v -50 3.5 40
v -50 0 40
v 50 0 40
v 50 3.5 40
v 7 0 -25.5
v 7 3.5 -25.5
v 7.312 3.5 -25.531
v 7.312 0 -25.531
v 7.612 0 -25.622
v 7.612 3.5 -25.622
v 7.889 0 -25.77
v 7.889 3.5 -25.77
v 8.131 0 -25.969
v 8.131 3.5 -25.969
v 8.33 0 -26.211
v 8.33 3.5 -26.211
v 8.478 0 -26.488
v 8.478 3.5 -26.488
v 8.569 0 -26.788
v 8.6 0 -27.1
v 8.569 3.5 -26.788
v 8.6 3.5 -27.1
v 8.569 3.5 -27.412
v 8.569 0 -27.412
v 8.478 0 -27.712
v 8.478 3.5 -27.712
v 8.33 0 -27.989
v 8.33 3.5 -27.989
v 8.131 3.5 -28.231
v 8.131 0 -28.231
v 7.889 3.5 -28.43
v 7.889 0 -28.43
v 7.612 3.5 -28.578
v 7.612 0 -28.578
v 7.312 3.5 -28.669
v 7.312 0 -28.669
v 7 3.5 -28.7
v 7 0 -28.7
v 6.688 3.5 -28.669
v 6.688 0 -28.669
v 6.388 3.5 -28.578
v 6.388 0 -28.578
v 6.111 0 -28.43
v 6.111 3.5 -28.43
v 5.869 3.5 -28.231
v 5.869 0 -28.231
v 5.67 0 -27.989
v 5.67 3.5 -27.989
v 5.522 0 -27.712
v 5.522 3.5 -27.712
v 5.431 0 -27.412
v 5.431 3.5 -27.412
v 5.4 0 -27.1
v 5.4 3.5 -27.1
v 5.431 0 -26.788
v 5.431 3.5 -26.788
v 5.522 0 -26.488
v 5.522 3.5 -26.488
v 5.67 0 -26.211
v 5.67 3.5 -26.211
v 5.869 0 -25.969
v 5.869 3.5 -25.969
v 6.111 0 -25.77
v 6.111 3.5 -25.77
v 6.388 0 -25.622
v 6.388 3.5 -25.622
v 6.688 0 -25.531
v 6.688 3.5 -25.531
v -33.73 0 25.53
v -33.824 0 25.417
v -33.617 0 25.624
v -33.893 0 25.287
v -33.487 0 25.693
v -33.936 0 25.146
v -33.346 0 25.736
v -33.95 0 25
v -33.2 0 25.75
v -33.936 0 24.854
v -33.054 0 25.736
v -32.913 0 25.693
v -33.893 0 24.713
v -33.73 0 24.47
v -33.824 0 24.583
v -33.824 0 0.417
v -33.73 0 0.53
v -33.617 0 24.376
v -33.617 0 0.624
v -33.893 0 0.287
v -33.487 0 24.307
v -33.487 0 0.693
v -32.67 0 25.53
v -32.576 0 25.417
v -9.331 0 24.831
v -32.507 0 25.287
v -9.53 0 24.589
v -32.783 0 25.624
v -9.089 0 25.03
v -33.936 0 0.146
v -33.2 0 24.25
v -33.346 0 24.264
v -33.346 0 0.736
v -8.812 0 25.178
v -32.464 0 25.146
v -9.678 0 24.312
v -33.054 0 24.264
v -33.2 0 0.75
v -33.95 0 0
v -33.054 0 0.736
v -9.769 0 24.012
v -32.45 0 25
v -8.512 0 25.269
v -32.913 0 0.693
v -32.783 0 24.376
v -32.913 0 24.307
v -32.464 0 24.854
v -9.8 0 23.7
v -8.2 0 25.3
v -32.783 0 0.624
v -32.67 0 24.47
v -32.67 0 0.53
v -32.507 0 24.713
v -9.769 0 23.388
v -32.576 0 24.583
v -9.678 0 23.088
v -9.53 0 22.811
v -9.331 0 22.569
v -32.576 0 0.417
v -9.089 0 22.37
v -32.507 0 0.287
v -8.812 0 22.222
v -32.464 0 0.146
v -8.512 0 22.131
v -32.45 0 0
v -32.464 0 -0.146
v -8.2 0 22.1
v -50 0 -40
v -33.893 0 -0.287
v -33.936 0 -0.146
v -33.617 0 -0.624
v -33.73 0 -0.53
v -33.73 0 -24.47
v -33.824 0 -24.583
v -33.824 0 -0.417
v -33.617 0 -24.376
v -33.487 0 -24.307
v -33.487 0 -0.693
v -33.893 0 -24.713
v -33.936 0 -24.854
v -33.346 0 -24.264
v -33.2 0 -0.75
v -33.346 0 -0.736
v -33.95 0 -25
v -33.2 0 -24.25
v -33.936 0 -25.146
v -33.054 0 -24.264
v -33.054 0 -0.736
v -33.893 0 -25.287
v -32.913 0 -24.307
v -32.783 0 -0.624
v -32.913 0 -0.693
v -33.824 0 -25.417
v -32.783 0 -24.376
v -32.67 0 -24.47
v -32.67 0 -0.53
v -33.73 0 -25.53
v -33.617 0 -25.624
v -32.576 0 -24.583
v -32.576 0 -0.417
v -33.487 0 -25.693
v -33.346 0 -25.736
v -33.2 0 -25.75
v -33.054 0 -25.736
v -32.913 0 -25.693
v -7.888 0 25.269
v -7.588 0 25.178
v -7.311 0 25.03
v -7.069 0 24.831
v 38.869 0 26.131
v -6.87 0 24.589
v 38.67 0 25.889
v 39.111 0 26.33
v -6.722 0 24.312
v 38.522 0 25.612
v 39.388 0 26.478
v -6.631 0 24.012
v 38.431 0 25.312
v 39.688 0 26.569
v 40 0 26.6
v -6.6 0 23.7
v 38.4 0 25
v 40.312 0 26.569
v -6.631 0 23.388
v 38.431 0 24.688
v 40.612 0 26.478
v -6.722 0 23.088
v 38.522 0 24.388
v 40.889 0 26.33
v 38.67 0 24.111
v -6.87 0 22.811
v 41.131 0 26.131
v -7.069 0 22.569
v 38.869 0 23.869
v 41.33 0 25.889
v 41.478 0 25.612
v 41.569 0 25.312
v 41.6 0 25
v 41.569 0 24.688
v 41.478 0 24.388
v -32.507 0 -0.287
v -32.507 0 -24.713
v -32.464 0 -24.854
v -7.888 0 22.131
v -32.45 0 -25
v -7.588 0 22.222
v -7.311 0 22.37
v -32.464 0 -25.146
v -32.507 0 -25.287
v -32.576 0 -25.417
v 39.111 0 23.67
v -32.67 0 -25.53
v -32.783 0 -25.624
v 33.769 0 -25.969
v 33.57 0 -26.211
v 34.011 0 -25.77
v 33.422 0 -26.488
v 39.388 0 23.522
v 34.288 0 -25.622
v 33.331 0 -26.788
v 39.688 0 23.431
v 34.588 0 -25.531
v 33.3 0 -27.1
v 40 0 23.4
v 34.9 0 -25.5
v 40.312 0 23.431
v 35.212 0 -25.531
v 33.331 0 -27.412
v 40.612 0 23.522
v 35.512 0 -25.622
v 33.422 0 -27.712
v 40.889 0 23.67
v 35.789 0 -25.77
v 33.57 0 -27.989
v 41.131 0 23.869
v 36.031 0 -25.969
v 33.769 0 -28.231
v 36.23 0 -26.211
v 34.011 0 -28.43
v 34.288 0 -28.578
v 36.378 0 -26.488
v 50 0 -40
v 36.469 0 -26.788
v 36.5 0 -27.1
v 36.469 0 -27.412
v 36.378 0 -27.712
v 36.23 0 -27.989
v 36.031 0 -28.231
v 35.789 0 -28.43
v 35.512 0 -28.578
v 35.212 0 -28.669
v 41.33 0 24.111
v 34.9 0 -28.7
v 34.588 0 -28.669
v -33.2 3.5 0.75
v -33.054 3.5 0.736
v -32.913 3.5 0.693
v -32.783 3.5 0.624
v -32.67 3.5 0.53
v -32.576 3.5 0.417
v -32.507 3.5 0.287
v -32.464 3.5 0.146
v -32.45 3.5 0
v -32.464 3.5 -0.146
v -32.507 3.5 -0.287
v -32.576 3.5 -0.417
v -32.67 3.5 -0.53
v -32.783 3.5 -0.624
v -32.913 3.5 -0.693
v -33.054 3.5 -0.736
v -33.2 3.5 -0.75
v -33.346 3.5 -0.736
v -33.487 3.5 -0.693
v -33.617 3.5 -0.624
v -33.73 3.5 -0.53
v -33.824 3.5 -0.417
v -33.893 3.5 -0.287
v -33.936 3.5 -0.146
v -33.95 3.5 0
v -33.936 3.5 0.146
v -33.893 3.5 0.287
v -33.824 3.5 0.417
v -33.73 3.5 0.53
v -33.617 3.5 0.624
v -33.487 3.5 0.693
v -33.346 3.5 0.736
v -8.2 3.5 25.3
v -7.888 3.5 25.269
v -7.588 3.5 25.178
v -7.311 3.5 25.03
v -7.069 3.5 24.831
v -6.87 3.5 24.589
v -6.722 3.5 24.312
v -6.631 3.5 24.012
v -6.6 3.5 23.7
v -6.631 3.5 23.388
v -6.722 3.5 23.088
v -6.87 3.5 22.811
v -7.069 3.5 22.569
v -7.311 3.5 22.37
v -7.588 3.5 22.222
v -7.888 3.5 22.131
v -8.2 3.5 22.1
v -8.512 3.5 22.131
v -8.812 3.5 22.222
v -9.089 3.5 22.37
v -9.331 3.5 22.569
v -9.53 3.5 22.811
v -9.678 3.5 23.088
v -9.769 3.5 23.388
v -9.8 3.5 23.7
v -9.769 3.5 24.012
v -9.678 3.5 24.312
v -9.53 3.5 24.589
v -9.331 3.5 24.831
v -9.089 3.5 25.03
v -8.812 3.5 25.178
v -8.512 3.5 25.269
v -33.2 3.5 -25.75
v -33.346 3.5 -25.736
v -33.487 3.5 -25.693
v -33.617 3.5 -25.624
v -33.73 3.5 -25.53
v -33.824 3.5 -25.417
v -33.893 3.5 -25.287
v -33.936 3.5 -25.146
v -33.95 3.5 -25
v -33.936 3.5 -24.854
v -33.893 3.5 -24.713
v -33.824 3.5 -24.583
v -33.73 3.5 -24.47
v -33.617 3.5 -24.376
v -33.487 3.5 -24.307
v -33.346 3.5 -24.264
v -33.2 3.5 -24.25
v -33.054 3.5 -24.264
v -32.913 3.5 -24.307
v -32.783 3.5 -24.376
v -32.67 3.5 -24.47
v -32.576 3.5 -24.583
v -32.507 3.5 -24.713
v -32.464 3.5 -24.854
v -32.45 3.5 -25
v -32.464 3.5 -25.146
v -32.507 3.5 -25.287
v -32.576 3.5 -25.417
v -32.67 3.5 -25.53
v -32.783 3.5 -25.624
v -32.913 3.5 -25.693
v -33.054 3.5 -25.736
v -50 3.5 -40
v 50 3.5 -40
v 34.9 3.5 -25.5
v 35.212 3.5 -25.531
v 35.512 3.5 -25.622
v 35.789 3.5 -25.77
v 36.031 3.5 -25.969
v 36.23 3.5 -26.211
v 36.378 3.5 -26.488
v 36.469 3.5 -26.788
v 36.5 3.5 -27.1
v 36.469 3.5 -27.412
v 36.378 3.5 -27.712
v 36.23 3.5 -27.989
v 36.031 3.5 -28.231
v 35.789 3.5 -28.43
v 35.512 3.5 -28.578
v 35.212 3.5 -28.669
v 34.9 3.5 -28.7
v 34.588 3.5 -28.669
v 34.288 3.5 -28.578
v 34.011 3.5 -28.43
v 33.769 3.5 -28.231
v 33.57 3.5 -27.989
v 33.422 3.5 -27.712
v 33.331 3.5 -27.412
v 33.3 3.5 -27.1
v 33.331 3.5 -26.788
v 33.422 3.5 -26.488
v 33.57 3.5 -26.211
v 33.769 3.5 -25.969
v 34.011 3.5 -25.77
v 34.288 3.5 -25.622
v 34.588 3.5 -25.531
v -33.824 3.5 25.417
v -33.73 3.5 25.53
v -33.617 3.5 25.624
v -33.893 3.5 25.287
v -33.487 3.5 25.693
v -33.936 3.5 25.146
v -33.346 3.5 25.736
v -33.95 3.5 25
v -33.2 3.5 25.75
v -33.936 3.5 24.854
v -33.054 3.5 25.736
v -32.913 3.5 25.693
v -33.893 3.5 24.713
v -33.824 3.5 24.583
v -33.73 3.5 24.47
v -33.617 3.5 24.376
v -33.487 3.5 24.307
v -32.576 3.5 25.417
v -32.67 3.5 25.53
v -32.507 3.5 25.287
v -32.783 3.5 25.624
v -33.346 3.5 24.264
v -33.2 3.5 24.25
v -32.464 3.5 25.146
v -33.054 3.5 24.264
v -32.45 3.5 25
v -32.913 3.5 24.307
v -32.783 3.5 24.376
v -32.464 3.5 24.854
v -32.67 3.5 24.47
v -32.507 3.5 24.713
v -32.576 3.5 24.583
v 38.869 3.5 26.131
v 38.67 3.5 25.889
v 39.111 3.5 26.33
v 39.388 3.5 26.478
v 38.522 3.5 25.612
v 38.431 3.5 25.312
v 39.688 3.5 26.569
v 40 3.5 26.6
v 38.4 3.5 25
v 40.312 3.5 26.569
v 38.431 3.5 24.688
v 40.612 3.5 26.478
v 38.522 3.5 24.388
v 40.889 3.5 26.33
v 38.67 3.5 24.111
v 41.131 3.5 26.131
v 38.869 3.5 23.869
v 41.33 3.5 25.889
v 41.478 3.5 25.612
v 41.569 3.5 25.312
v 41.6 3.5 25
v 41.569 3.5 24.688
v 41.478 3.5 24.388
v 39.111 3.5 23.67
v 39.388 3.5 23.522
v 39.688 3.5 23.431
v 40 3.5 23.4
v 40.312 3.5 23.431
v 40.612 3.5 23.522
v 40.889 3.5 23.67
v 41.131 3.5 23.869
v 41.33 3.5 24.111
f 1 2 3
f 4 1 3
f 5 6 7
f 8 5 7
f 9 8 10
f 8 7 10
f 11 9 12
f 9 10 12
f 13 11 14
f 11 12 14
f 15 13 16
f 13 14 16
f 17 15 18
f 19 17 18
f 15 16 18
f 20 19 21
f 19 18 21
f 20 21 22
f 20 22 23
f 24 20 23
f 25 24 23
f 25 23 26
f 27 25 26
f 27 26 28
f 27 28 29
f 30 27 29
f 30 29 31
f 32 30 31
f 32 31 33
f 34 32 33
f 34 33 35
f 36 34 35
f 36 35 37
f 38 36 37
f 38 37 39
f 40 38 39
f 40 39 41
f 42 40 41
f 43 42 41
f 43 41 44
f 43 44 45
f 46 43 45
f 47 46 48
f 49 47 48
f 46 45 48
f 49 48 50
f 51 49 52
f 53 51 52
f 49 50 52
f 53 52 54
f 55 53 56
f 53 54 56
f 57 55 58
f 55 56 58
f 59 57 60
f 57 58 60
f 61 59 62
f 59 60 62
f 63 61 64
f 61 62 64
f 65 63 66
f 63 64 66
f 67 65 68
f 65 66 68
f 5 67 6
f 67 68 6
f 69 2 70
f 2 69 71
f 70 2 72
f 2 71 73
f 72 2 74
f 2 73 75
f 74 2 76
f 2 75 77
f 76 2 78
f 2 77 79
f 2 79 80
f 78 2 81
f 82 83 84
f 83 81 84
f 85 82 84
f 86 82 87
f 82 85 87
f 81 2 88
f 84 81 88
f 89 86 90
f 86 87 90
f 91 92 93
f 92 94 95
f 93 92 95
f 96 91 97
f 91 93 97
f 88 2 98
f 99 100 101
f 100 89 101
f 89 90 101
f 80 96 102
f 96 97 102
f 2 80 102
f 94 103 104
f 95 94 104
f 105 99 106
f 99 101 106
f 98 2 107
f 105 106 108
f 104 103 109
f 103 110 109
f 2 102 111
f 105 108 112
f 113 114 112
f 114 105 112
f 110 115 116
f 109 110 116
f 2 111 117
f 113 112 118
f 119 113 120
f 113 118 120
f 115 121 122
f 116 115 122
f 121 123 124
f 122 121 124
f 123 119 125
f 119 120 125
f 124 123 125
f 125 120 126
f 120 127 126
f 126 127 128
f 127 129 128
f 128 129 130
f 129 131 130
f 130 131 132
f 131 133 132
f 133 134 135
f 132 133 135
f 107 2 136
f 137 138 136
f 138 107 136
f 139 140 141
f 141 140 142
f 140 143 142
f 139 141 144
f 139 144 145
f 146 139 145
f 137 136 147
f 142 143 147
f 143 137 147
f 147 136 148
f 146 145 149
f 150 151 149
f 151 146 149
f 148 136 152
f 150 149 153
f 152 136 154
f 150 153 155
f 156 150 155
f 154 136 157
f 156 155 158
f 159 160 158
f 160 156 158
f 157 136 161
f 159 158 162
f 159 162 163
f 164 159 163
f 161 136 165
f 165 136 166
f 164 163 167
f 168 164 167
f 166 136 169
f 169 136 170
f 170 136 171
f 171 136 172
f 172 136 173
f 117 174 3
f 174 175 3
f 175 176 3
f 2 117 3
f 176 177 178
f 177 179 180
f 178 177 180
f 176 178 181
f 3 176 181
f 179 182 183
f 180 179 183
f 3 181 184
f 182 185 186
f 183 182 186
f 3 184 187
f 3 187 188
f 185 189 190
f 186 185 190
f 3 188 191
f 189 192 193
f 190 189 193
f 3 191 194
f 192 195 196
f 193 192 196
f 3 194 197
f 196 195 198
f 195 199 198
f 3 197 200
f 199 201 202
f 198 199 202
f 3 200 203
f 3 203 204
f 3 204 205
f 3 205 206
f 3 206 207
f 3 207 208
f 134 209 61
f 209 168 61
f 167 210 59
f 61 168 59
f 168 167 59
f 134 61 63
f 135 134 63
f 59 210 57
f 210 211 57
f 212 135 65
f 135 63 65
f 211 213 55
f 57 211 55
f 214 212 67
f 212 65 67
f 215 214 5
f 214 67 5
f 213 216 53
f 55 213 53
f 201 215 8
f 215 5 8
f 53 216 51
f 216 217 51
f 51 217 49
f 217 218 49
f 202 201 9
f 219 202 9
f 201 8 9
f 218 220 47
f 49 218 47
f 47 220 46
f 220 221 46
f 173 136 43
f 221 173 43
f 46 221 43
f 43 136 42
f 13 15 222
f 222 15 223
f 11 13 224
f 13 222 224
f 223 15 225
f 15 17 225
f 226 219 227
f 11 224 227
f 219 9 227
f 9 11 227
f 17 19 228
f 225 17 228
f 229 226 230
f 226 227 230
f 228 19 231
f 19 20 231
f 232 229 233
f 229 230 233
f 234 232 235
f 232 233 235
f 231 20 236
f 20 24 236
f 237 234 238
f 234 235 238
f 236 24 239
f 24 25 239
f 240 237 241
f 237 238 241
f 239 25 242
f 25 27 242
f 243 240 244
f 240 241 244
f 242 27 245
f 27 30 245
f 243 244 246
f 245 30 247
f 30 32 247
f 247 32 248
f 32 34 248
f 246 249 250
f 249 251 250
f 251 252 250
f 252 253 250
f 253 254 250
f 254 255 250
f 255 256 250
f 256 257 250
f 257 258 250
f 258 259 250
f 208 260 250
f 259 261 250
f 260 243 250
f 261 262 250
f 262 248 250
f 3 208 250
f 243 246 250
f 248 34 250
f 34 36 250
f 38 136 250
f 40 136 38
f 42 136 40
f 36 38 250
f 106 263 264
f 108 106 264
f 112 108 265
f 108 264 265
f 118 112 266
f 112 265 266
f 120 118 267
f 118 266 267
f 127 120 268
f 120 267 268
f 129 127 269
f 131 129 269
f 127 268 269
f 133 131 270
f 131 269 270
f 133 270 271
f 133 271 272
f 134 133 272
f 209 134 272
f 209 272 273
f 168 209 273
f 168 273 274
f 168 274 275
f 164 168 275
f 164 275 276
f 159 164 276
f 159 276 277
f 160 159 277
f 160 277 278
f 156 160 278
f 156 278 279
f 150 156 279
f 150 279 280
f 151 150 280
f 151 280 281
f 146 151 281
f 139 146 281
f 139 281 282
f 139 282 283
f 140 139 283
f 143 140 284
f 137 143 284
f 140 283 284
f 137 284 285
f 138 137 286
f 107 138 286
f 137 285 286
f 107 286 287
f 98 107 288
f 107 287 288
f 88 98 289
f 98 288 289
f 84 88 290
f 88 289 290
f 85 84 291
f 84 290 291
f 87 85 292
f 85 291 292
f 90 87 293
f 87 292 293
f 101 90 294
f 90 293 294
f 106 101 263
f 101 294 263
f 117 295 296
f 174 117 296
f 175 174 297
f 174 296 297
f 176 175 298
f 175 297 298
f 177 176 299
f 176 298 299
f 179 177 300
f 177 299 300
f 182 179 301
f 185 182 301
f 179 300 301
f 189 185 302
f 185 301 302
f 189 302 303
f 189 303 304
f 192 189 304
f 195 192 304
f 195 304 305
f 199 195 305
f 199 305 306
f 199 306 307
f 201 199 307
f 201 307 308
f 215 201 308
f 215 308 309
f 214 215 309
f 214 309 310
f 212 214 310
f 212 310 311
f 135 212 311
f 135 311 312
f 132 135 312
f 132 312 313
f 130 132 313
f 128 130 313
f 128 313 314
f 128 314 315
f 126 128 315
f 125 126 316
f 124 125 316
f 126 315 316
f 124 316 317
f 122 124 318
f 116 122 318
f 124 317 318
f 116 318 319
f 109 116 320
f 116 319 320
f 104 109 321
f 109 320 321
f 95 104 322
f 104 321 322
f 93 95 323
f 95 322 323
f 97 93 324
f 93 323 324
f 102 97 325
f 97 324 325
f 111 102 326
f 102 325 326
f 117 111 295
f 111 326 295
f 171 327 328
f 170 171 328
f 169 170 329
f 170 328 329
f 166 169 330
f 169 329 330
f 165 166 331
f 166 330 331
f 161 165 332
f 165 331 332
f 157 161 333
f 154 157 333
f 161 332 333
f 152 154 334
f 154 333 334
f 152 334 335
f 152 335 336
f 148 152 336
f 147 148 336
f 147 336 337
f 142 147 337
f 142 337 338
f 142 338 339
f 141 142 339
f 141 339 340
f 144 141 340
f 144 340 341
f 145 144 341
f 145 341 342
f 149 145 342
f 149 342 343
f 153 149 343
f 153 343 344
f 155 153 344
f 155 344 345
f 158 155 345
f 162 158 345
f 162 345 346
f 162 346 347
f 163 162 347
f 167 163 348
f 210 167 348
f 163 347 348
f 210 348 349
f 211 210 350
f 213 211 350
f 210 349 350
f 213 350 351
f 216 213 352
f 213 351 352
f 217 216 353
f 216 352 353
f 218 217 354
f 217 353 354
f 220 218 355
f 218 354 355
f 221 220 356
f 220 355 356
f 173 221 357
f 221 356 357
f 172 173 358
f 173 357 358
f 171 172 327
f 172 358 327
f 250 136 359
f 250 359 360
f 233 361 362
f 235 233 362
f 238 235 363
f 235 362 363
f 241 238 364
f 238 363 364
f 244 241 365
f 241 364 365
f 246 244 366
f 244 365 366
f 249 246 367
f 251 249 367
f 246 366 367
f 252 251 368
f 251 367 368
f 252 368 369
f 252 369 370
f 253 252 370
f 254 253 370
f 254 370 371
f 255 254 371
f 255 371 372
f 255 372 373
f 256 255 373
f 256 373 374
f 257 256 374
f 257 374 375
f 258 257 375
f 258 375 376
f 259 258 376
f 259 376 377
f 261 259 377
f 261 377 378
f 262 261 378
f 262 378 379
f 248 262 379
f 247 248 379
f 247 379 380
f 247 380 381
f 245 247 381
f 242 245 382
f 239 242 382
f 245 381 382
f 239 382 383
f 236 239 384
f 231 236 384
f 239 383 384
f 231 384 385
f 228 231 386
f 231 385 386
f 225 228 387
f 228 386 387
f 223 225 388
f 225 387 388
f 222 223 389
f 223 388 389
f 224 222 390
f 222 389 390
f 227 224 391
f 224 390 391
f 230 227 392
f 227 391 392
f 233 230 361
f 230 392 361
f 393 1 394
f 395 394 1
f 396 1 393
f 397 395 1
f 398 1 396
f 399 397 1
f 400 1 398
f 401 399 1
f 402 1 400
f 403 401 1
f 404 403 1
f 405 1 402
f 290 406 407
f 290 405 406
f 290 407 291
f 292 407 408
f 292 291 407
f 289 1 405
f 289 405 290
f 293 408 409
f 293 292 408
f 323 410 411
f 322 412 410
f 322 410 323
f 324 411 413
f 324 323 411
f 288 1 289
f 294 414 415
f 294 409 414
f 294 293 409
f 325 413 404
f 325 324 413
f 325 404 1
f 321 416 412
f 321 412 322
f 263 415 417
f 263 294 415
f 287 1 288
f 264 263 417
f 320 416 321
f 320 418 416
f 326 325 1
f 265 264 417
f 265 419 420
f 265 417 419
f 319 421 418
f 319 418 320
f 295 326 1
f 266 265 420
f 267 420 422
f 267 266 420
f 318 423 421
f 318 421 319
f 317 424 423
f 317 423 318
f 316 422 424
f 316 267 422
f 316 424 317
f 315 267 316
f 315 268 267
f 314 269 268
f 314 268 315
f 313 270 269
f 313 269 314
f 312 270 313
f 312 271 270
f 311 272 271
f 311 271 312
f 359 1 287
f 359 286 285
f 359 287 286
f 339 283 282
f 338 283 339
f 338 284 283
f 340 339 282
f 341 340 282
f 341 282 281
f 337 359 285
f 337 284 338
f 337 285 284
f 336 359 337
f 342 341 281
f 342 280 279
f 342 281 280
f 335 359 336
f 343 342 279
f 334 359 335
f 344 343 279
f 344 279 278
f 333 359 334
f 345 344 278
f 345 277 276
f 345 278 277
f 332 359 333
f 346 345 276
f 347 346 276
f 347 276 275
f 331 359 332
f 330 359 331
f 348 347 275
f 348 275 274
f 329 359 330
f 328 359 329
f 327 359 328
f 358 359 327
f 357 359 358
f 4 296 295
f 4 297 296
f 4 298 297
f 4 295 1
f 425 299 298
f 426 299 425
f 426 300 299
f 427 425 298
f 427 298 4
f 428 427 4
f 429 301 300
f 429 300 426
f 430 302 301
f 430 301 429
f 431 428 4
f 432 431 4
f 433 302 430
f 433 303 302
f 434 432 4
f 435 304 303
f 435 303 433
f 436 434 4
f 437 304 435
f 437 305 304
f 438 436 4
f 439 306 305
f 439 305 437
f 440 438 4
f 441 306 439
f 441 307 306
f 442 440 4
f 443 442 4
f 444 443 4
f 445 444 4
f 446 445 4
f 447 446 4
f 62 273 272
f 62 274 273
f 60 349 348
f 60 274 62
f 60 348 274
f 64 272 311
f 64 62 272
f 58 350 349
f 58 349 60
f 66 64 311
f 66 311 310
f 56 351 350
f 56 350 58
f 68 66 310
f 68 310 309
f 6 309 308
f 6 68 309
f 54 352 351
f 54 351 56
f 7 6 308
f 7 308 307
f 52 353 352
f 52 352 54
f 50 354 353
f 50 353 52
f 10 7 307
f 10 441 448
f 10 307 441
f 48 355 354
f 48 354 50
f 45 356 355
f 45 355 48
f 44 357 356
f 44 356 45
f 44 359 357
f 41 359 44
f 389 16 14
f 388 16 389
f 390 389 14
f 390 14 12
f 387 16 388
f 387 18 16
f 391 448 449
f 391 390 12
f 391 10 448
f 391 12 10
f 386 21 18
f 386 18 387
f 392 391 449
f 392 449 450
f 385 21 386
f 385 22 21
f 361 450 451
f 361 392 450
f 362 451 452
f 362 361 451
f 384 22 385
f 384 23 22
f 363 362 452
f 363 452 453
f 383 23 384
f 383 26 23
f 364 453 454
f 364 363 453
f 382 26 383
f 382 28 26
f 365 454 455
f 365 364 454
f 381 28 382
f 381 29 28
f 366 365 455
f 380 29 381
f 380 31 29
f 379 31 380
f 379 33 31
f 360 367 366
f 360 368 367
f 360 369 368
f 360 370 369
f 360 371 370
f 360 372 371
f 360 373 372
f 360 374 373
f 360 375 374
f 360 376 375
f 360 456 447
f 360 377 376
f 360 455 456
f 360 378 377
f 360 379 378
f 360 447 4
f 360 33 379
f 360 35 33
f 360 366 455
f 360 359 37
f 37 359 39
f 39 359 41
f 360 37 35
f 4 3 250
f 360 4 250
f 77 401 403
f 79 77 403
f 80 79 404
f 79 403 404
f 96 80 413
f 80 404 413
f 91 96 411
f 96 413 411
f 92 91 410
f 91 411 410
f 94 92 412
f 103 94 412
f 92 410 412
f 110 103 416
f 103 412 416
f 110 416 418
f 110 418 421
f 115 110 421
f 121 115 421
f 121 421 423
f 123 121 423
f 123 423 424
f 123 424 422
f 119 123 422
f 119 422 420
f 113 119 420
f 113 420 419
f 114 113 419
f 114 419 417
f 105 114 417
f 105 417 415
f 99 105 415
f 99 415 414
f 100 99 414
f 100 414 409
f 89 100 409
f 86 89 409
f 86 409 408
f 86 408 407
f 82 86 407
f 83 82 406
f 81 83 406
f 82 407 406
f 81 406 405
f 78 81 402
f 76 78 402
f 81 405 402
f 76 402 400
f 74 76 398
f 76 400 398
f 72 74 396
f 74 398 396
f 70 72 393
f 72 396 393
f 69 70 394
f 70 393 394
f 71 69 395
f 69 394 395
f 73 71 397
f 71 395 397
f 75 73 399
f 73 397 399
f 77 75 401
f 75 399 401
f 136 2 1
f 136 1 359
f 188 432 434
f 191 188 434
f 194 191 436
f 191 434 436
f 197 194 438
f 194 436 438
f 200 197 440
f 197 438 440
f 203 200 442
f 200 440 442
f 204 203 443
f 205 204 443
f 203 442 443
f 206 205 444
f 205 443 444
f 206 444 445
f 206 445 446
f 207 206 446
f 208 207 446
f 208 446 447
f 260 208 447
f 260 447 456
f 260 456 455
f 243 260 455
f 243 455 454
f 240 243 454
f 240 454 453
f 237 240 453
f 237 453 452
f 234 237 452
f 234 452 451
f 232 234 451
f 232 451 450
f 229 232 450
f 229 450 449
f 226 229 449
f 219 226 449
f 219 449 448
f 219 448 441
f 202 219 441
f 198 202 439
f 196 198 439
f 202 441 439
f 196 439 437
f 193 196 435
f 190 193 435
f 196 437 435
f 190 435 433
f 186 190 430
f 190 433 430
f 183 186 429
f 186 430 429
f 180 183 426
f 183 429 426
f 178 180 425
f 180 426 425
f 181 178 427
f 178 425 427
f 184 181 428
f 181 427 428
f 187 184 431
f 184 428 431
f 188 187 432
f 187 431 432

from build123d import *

# Parameters (mm, degrees)
SKETCH1_W           = 100
SKETCH1_H           = 80
BOSS_EXTRUDE1_DEPTH = 3.5
SKETCH2_R           = 1.6
SKETCH2_R_2         = 0.75
CUT_EXTRUDE1_DEPTH  = 65.126827459


with BuildPart() as part:
    # Sketch1 → Boss-Extrude1 (new body)
    with BuildSketch(Plane(origin=(0, 0, 0), x_dir=(1, 0, 0), z_dir=(0, 1, 0))):
        Rectangle(SKETCH1_W, SKETCH1_H)
    extrude(amount=BOSS_EXTRUDE1_DEPTH)

    # Sketch2 → Cut-Extrude1 (cut, through all)
    with BuildSketch(Plane(origin=(0, 3.5, 0), x_dir=(1, 0, 0), z_dir=(0, 1, 0))):
        with Locations(Location((40, -25, 0), (0, 0, 270))):
            Circle(SKETCH2_R)
        with Locations(Location((-8.2, -23.7, 0), (0, 0, 270))):
            Circle(SKETCH2_R)
        with Locations(Location((7, 27.1, 0), (0, 0, 270))):
            Circle(SKETCH2_R)
        with Locations(Location((34.9, 27.1, 0), (0, 0, 270))):
            Circle(SKETCH2_R)
        with Locations(Location((-33.2, -25, 0), (0, 0, 270))):
            Circle(SKETCH2_R_2)
        with Locations(Location((-33.2, 25, 0), (0, 0, 90))):
            Circle(SKETCH2_R_2)
        with Locations(Location((-33.2, 0, 0), (0, 0, 270))):
            Circle(SKETCH2_R_2)
    extrude(amount=-CUT_EXTRUDE1_DEPTH, mode=Mode.SUBTRACT)


solid = part.part
